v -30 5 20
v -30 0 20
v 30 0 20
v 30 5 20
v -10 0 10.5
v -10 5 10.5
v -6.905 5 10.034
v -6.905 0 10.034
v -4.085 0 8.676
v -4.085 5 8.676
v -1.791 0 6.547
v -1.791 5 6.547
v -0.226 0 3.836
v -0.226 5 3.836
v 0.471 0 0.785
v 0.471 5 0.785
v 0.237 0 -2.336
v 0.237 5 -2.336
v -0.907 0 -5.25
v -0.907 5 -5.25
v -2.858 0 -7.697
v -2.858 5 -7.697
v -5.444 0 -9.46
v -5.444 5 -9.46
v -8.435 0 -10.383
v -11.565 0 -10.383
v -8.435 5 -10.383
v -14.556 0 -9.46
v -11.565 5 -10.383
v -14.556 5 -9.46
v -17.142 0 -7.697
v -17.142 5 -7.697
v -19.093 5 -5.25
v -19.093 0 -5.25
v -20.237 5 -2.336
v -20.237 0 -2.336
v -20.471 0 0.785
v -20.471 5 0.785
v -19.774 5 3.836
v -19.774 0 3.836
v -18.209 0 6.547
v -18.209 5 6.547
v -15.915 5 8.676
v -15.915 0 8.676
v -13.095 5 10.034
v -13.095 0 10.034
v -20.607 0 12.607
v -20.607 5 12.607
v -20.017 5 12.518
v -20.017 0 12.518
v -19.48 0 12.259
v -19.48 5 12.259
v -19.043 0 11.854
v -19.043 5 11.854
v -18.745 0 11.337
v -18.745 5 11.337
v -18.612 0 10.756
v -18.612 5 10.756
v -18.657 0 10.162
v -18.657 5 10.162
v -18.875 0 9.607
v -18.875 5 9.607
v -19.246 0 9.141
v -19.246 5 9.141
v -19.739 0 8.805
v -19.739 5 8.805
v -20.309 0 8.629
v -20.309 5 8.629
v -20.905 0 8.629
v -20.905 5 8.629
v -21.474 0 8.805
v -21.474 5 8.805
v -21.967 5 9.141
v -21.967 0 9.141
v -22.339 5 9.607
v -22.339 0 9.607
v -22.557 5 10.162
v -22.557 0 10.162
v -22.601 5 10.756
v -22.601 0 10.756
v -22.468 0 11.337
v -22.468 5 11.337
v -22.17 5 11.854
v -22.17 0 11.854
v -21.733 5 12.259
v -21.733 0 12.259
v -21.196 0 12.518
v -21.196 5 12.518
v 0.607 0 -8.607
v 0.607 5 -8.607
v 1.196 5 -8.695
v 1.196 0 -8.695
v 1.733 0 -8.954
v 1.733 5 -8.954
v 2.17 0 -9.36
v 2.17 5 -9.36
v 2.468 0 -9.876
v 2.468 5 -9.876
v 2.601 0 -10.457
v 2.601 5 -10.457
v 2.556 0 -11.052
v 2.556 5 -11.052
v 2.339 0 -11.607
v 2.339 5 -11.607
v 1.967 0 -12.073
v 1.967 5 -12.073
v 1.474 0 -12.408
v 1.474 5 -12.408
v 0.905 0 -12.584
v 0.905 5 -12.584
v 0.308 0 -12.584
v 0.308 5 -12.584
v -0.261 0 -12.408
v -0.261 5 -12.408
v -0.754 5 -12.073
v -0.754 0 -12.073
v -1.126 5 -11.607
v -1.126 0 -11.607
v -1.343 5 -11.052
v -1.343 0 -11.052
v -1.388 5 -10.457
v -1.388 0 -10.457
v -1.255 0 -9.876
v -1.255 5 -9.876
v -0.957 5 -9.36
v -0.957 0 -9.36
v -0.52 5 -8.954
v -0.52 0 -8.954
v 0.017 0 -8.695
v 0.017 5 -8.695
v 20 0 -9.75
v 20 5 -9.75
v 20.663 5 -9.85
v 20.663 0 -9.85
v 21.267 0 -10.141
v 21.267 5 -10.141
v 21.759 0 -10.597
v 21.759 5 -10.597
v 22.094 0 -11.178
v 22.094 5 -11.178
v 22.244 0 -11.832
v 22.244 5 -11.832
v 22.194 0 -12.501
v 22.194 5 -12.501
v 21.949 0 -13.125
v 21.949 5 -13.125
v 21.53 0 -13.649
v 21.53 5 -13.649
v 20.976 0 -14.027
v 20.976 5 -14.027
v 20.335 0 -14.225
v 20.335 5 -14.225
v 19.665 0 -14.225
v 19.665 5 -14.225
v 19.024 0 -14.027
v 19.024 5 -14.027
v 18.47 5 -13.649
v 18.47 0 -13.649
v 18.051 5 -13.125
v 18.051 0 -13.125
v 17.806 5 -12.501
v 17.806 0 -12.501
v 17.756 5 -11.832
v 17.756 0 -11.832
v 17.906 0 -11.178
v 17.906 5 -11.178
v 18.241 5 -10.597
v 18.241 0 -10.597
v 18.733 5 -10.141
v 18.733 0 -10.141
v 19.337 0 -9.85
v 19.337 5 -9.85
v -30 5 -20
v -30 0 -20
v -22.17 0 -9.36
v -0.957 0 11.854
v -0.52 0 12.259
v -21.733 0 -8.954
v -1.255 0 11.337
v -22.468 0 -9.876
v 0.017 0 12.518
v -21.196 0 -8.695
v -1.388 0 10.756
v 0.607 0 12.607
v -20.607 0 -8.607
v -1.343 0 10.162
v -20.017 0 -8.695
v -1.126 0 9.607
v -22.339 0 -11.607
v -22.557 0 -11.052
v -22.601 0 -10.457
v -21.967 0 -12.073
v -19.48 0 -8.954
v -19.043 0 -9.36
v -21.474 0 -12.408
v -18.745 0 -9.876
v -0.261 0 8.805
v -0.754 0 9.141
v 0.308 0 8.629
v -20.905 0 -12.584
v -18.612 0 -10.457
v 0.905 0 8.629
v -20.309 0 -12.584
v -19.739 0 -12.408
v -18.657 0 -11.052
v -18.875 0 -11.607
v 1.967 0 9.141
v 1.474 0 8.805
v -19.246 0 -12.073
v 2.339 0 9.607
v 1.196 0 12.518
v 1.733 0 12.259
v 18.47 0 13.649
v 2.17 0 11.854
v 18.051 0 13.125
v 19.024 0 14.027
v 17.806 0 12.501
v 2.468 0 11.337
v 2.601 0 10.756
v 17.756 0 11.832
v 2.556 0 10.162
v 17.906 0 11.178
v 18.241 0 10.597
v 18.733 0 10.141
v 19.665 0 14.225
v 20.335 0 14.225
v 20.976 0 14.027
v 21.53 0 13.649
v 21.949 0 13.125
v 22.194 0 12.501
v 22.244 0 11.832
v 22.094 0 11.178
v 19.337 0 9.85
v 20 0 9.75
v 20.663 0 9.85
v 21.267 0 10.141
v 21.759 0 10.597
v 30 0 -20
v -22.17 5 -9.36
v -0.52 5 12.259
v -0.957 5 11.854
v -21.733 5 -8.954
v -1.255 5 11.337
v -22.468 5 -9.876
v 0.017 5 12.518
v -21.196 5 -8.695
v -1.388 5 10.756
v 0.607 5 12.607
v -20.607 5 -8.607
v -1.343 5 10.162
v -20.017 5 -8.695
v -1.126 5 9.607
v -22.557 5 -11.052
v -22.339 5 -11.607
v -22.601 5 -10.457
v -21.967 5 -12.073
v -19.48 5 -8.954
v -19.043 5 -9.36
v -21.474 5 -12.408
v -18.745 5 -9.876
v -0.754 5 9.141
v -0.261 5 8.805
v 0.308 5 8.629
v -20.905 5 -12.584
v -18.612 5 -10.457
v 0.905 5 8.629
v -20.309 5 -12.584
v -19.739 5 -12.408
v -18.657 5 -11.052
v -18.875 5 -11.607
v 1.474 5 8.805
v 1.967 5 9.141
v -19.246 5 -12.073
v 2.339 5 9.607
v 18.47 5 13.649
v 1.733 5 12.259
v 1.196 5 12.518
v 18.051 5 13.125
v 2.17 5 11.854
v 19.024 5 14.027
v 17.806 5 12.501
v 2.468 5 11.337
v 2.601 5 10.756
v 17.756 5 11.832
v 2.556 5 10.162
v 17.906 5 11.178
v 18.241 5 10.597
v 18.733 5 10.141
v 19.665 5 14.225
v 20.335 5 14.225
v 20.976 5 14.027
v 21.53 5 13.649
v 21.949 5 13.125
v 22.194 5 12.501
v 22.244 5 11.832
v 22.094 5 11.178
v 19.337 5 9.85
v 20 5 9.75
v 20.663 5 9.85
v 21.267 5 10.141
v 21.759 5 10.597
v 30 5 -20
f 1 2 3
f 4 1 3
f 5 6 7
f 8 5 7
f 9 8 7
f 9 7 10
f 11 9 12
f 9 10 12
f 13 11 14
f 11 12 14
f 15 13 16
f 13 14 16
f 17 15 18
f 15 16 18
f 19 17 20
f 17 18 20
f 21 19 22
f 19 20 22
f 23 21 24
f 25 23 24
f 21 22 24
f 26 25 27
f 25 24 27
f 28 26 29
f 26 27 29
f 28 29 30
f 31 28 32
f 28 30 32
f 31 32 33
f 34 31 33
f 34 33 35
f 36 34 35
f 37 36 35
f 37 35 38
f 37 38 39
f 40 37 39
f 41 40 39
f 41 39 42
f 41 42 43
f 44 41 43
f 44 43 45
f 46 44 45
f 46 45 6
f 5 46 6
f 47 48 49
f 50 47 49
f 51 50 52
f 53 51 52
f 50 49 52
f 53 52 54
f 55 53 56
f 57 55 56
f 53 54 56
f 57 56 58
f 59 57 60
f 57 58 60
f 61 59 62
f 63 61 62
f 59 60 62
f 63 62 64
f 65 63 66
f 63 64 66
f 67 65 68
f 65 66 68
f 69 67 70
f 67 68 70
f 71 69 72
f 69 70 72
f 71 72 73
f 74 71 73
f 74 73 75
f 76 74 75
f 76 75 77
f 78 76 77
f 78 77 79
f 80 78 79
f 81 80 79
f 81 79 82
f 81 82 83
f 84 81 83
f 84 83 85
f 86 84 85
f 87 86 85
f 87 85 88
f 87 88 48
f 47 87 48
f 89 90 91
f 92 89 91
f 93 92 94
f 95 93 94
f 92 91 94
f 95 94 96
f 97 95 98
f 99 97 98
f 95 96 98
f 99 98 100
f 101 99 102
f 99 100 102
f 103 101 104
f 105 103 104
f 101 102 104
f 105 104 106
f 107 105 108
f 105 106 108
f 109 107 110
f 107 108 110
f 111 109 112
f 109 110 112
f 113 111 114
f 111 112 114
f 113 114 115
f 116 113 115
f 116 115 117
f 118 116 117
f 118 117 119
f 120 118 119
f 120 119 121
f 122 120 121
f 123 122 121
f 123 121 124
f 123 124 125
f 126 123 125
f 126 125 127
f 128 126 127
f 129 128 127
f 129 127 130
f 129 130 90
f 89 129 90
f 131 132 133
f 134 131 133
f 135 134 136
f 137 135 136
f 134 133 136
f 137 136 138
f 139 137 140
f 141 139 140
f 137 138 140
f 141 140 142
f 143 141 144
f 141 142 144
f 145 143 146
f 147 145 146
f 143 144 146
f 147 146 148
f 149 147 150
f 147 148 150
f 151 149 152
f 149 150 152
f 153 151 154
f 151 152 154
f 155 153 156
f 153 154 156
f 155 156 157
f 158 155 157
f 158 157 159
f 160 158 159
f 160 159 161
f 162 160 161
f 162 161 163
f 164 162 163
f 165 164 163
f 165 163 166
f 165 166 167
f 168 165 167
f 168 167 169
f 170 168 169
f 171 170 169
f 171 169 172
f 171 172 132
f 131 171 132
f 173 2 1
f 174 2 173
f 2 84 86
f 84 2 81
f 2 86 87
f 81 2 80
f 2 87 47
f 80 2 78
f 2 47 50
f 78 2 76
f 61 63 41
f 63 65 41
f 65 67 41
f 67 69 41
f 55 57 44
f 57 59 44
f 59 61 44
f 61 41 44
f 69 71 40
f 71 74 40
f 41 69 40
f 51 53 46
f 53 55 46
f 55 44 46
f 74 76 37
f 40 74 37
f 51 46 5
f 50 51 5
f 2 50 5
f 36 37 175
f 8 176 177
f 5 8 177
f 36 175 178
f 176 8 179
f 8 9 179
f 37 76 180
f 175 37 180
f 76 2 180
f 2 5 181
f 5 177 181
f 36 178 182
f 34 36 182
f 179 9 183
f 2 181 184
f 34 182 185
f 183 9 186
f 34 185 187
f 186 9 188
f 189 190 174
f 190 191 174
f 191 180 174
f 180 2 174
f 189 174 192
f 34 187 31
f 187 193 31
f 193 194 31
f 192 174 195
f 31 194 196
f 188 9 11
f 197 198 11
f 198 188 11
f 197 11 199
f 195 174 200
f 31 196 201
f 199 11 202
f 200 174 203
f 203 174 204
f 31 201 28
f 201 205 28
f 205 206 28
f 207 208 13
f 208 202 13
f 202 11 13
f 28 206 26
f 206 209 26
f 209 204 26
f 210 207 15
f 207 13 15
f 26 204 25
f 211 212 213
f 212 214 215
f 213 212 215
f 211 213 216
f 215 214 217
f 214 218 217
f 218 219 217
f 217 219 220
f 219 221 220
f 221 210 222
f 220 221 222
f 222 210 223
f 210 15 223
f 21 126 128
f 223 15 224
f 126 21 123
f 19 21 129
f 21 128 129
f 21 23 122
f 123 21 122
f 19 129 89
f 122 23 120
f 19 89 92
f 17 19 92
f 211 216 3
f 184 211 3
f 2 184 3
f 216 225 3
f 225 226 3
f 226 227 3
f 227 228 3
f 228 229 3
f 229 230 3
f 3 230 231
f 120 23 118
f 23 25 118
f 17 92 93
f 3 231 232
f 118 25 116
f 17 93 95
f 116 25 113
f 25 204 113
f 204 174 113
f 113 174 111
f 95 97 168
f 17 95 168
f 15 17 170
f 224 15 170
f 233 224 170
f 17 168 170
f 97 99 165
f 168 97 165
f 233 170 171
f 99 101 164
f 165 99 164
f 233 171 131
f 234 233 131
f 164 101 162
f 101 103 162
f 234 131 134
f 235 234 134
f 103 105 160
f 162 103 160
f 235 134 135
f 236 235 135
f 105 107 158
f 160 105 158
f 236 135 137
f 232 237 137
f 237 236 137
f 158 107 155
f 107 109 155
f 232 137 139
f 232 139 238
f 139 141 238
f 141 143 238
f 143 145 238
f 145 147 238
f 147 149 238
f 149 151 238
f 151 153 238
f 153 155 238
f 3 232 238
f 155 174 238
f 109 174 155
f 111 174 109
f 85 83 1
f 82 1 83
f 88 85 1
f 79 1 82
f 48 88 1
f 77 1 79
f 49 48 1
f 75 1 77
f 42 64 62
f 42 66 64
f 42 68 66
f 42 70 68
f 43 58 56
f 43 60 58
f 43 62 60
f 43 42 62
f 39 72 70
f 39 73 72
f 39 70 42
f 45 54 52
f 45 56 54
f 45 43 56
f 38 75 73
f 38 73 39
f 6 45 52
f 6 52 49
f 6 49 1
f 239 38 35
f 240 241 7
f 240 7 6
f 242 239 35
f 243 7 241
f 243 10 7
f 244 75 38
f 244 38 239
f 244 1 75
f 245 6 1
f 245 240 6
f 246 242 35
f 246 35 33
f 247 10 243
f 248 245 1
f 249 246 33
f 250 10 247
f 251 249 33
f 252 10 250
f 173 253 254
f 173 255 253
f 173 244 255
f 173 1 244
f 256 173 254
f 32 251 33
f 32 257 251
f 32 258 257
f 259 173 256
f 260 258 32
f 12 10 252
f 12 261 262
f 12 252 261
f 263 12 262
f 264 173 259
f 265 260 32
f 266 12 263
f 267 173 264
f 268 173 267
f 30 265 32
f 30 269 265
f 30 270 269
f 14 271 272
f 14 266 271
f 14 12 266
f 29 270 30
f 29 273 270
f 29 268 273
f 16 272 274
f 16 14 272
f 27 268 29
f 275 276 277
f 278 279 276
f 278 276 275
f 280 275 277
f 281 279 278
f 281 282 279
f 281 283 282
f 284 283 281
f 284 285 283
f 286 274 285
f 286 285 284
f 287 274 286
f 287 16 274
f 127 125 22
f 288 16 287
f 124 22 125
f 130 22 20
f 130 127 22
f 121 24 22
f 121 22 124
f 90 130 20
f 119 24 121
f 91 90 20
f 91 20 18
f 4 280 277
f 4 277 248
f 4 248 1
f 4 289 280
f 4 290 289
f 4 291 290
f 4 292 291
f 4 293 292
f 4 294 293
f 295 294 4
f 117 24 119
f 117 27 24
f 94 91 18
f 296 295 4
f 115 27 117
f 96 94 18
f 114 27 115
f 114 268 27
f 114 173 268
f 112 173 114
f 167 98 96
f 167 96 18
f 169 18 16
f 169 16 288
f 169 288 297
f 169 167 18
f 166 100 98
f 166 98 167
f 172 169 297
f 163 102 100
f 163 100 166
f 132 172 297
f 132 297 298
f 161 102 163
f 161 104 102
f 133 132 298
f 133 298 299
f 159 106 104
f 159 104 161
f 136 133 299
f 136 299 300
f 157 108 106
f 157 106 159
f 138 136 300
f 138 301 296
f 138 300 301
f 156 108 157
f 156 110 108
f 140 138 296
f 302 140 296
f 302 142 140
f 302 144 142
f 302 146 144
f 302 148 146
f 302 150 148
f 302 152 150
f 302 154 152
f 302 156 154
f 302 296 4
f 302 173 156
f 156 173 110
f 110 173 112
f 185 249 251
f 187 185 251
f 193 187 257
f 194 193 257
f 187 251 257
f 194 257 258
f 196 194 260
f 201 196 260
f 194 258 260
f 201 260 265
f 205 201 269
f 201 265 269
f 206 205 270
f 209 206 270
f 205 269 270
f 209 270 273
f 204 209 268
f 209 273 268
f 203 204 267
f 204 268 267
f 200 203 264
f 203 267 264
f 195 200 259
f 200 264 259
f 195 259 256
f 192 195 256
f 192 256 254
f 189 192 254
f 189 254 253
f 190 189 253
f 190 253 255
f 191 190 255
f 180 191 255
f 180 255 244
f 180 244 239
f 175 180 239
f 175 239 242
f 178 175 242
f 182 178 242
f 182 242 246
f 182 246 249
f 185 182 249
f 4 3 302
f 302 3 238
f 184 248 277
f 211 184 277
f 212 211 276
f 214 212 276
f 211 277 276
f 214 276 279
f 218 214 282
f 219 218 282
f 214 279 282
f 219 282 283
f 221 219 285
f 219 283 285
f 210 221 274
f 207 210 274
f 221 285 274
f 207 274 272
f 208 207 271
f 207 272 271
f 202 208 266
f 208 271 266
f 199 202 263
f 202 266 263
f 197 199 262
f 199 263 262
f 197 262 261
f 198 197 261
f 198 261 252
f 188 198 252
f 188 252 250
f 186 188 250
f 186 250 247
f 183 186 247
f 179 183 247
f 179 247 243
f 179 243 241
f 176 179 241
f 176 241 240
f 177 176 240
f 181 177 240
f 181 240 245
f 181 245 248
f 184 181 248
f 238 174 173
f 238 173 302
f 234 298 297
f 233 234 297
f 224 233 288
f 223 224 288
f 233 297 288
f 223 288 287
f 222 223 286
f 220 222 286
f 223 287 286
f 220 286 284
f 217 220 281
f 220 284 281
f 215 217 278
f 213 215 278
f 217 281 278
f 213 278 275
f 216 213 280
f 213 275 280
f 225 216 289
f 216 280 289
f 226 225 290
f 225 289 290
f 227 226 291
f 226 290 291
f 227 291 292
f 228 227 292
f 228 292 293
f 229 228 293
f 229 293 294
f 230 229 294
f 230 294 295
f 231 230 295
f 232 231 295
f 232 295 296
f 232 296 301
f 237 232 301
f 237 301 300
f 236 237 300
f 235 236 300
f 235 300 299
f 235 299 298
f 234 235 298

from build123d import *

# Parameters (mm, degrees)
SKETCH1_W           = 60
SKETCH1_H           = 40
BOSS_EXTRUDE1_DEPTH = 5
SKETCH4_R           = 2.25
CUT_EXTRUDE2_DEPTH  = 37.400549446
SKETCH6_R           = 10.5
SKETCH6_R_2         = 2
CUT_EXTRUDE3_DEPTH  = 37.400549446


with BuildPart() as part:
    # Sketch1 → Boss-Extrude1 (new body)
    with BuildSketch(Plane(origin=(0, 0, 0), x_dir=(1, 0, 0), z_dir=(0, 1, 0))):
        Rectangle(SKETCH1_W, SKETCH1_H)
    extrude(amount=BOSS_EXTRUDE1_DEPTH)

    # Sketch4 → Cut-Extrude2 (cut, through all)
    with BuildSketch(Plane(origin=(0, 5, 0), x_dir=(1, 0, 0), z_dir=(0, 1, 0))):
        with Locations(Location((20, 12, 0), (0, 0, 270))):
            Circle(SKETCH4_R)
        with Locations(Location((20, -12, 0), (0, 0, 90))):
            Circle(SKETCH4_R)
    extrude(amount=-CUT_EXTRUDE2_DEPTH, mode=Mode.SUBTRACT)

    # Sketch6 → Cut-Extrude3 (cut, through all)
    with BuildSketch(Plane(origin=(0, 5, 0), x_dir=(1, 0, 0), z_dir=(0, 1, 0))):
        with Locations(Location((-10.000056756, -7.4323e-05, 0), (0, 0, 270))):
            Circle(SKETCH6_R)
        with Locations(Location((-20.606658473, 10.606527395, 0), (0, 0, 270))):
            Circle(SKETCH6_R_2)
        with Locations(Location((0.606544962, 10.606527395, 0), (0, 0, 270))):
            Circle(SKETCH6_R_2)
        with Locations(Location((0.606544962, -10.606676041, 0), (0, 0, 270))):
            Circle(SKETCH6_R_2)
        with Locations(Location((-20.606658473, -10.606676041, 0), (0, 0, 270))):
            Circle(SKETCH6_R_2)
    extrude(amount=-CUT_EXTRUDE3_DEPTH, mode=Mode.SUBTRACT)


solid = part.part
